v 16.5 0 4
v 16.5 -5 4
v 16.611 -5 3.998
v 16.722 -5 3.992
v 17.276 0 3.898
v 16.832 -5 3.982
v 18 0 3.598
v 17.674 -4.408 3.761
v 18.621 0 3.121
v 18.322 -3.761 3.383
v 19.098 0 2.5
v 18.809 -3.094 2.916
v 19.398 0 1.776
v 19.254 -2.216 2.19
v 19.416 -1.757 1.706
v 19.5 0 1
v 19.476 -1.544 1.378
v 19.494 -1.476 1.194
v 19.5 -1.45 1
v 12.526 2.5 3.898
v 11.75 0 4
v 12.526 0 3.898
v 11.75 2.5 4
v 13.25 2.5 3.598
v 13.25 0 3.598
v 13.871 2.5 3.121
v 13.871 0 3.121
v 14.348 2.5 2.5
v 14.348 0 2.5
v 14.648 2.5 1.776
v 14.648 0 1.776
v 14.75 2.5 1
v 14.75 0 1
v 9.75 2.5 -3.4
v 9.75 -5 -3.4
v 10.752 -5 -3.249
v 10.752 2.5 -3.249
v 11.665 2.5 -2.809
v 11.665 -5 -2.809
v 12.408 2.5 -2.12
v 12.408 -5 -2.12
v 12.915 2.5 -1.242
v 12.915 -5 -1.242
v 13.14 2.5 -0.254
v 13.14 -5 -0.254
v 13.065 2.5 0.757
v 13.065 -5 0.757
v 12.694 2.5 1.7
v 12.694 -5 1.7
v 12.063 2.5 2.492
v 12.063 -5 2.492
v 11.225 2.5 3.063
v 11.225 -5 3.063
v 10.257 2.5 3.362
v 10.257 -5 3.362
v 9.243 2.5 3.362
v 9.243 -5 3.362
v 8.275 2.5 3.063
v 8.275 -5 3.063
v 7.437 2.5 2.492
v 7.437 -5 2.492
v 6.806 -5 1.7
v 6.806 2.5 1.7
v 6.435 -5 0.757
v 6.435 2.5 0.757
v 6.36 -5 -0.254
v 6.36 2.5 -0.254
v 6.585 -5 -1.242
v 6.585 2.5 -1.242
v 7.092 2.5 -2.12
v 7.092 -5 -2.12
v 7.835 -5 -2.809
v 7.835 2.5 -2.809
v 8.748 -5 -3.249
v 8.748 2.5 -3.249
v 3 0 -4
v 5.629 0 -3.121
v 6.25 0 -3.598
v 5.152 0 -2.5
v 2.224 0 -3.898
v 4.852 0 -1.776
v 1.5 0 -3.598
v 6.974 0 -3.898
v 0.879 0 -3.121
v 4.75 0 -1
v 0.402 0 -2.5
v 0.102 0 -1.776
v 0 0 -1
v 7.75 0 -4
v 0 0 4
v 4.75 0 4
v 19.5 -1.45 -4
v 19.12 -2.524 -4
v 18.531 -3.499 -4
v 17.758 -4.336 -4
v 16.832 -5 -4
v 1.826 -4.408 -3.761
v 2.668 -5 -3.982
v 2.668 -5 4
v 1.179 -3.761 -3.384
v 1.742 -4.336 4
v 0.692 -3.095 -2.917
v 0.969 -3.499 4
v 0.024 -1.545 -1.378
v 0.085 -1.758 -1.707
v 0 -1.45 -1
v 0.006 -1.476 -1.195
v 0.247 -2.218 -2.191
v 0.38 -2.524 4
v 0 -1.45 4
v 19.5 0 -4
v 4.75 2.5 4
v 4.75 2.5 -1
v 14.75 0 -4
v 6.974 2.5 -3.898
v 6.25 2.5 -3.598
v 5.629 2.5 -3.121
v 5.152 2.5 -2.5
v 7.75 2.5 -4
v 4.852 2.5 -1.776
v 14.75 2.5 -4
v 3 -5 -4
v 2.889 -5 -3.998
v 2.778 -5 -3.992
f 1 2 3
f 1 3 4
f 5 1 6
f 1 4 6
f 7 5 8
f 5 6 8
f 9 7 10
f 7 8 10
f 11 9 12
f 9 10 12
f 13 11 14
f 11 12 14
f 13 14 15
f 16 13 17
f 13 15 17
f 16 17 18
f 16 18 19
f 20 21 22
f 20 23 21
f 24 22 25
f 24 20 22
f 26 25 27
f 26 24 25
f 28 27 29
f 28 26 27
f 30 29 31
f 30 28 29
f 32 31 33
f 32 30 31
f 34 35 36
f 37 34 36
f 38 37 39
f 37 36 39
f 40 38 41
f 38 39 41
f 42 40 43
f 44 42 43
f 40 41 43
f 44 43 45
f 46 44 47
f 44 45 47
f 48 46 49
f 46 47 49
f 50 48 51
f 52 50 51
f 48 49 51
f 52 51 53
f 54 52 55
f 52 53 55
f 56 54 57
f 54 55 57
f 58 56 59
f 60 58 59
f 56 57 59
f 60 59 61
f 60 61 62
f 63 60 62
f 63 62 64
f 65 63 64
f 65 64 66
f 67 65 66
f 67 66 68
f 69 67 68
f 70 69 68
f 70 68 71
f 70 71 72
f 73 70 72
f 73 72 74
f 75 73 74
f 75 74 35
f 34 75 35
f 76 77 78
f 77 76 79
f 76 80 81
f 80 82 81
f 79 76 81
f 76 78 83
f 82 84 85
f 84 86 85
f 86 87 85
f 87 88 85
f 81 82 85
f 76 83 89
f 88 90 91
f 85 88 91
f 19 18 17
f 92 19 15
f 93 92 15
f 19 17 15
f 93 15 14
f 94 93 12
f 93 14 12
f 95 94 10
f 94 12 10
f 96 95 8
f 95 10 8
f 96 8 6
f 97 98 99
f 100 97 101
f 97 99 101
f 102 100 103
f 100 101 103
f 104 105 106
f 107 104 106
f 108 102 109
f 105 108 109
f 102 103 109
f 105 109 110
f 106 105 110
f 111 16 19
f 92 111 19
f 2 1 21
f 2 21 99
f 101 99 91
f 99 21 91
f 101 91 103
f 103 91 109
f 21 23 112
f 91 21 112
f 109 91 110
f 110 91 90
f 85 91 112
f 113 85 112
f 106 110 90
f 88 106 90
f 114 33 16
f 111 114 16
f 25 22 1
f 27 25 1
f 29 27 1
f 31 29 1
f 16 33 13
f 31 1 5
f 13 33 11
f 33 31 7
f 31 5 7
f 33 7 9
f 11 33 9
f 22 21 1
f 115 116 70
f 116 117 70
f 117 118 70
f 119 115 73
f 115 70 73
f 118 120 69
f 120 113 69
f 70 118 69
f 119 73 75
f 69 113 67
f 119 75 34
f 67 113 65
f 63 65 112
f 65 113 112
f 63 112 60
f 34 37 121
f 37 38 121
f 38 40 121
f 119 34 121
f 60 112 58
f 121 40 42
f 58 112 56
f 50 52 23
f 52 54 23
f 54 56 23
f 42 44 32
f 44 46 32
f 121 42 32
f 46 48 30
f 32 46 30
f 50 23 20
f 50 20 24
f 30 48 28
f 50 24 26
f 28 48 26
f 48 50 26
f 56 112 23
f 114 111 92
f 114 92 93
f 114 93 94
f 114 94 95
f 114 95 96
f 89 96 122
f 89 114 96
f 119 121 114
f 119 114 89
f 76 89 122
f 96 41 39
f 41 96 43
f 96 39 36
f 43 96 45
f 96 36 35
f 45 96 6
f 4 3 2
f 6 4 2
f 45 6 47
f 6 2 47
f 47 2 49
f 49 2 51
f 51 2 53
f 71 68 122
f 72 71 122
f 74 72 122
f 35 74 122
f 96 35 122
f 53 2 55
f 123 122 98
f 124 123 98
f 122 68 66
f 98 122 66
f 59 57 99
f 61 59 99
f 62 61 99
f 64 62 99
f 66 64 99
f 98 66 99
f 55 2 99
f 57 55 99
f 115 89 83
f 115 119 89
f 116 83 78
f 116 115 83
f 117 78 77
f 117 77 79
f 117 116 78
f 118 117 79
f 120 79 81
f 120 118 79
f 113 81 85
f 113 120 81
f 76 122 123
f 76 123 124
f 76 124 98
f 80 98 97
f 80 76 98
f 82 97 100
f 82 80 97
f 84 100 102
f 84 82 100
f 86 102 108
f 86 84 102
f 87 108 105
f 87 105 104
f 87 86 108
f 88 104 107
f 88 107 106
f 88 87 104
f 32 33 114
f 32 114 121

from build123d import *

# Parameters (mm, degrees)
EXTRUDE_1_DEPTH        = 4
SKETCH_3_W             = 10
SKETCH_3_H             = 2.5
EXTRUDE_2_DEPTH        = 4
FILLET_1_R             = 3
HOLE_WIZARD_M8_1_D     = 6.8
HOLE_WIZARD_M8_1_DEPTH = 19.75
HOLE_WIZARD_M8_1_TIP   = 2.042926105


with BuildPart() as part:
    # 草图1 → 凸台-拉伸1 (new, symmetric)
    with BuildSketch(Plane.XY):
        with BuildLine():
            Line((16.832132438, -5), (2.667867562, -5))
            ThreePointArc((2.667867562, -5), (0.969162586, -3.499129927), (0, -1.45))
            Line((0, -1.45), (0, 0))
            Line((0, 0), (19.5, 0))
            Line((19.5, 0), (19.5, -1.45))
            ThreePointArc((19.5, -1.45), (18.530837414, -3.499129927), (16.832132438, -5))
        make_face()
    extrude(amount=EXTRUDE_1_DEPTH, both=True)

    # 草图3 → 凸台-拉伸2 (add, symmetric)
    with BuildSketch(Plane.XY):
        with Locations((9.75, 1.25)):
            Rectangle(SKETCH_3_W, SKETCH_3_H)
    extrude(amount=EXTRUDE_2_DEPTH, both=True)

    # 圆角1
    fillet_1_edges = [part.edges().sort_by_distance(p)[0] for p in [
        (19.5, -0.725, 4),
        (0, -0.725, -4),
        (4.75, 1.25, -4),
        (14.75, 1.25, 4),
    ]]
    fillet(fillet_1_edges, radius=FILLET_1_R)

    # M8 螺纹孔1
    with Locations(Plane(origin=(9.75, 2.5, 0), x_dir=(0, 0, 1), z_dir=(0, 1, 0))):
        with Locations((0, 0)):
            Hole(HOLE_WIZARD_M8_1_D / 2, depth=HOLE_WIZARD_M8_1_DEPTH)
            with Locations((0, 0, -(HOLE_WIZARD_M8_1_DEPTH + HOLE_WIZARD_M8_1_TIP / 2))):  # 118° drill point
                Cone(0, HOLE_WIZARD_M8_1_D / 2, HOLE_WIZARD_M8_1_TIP, mode=Mode.SUBTRACT)


solid = part.part
